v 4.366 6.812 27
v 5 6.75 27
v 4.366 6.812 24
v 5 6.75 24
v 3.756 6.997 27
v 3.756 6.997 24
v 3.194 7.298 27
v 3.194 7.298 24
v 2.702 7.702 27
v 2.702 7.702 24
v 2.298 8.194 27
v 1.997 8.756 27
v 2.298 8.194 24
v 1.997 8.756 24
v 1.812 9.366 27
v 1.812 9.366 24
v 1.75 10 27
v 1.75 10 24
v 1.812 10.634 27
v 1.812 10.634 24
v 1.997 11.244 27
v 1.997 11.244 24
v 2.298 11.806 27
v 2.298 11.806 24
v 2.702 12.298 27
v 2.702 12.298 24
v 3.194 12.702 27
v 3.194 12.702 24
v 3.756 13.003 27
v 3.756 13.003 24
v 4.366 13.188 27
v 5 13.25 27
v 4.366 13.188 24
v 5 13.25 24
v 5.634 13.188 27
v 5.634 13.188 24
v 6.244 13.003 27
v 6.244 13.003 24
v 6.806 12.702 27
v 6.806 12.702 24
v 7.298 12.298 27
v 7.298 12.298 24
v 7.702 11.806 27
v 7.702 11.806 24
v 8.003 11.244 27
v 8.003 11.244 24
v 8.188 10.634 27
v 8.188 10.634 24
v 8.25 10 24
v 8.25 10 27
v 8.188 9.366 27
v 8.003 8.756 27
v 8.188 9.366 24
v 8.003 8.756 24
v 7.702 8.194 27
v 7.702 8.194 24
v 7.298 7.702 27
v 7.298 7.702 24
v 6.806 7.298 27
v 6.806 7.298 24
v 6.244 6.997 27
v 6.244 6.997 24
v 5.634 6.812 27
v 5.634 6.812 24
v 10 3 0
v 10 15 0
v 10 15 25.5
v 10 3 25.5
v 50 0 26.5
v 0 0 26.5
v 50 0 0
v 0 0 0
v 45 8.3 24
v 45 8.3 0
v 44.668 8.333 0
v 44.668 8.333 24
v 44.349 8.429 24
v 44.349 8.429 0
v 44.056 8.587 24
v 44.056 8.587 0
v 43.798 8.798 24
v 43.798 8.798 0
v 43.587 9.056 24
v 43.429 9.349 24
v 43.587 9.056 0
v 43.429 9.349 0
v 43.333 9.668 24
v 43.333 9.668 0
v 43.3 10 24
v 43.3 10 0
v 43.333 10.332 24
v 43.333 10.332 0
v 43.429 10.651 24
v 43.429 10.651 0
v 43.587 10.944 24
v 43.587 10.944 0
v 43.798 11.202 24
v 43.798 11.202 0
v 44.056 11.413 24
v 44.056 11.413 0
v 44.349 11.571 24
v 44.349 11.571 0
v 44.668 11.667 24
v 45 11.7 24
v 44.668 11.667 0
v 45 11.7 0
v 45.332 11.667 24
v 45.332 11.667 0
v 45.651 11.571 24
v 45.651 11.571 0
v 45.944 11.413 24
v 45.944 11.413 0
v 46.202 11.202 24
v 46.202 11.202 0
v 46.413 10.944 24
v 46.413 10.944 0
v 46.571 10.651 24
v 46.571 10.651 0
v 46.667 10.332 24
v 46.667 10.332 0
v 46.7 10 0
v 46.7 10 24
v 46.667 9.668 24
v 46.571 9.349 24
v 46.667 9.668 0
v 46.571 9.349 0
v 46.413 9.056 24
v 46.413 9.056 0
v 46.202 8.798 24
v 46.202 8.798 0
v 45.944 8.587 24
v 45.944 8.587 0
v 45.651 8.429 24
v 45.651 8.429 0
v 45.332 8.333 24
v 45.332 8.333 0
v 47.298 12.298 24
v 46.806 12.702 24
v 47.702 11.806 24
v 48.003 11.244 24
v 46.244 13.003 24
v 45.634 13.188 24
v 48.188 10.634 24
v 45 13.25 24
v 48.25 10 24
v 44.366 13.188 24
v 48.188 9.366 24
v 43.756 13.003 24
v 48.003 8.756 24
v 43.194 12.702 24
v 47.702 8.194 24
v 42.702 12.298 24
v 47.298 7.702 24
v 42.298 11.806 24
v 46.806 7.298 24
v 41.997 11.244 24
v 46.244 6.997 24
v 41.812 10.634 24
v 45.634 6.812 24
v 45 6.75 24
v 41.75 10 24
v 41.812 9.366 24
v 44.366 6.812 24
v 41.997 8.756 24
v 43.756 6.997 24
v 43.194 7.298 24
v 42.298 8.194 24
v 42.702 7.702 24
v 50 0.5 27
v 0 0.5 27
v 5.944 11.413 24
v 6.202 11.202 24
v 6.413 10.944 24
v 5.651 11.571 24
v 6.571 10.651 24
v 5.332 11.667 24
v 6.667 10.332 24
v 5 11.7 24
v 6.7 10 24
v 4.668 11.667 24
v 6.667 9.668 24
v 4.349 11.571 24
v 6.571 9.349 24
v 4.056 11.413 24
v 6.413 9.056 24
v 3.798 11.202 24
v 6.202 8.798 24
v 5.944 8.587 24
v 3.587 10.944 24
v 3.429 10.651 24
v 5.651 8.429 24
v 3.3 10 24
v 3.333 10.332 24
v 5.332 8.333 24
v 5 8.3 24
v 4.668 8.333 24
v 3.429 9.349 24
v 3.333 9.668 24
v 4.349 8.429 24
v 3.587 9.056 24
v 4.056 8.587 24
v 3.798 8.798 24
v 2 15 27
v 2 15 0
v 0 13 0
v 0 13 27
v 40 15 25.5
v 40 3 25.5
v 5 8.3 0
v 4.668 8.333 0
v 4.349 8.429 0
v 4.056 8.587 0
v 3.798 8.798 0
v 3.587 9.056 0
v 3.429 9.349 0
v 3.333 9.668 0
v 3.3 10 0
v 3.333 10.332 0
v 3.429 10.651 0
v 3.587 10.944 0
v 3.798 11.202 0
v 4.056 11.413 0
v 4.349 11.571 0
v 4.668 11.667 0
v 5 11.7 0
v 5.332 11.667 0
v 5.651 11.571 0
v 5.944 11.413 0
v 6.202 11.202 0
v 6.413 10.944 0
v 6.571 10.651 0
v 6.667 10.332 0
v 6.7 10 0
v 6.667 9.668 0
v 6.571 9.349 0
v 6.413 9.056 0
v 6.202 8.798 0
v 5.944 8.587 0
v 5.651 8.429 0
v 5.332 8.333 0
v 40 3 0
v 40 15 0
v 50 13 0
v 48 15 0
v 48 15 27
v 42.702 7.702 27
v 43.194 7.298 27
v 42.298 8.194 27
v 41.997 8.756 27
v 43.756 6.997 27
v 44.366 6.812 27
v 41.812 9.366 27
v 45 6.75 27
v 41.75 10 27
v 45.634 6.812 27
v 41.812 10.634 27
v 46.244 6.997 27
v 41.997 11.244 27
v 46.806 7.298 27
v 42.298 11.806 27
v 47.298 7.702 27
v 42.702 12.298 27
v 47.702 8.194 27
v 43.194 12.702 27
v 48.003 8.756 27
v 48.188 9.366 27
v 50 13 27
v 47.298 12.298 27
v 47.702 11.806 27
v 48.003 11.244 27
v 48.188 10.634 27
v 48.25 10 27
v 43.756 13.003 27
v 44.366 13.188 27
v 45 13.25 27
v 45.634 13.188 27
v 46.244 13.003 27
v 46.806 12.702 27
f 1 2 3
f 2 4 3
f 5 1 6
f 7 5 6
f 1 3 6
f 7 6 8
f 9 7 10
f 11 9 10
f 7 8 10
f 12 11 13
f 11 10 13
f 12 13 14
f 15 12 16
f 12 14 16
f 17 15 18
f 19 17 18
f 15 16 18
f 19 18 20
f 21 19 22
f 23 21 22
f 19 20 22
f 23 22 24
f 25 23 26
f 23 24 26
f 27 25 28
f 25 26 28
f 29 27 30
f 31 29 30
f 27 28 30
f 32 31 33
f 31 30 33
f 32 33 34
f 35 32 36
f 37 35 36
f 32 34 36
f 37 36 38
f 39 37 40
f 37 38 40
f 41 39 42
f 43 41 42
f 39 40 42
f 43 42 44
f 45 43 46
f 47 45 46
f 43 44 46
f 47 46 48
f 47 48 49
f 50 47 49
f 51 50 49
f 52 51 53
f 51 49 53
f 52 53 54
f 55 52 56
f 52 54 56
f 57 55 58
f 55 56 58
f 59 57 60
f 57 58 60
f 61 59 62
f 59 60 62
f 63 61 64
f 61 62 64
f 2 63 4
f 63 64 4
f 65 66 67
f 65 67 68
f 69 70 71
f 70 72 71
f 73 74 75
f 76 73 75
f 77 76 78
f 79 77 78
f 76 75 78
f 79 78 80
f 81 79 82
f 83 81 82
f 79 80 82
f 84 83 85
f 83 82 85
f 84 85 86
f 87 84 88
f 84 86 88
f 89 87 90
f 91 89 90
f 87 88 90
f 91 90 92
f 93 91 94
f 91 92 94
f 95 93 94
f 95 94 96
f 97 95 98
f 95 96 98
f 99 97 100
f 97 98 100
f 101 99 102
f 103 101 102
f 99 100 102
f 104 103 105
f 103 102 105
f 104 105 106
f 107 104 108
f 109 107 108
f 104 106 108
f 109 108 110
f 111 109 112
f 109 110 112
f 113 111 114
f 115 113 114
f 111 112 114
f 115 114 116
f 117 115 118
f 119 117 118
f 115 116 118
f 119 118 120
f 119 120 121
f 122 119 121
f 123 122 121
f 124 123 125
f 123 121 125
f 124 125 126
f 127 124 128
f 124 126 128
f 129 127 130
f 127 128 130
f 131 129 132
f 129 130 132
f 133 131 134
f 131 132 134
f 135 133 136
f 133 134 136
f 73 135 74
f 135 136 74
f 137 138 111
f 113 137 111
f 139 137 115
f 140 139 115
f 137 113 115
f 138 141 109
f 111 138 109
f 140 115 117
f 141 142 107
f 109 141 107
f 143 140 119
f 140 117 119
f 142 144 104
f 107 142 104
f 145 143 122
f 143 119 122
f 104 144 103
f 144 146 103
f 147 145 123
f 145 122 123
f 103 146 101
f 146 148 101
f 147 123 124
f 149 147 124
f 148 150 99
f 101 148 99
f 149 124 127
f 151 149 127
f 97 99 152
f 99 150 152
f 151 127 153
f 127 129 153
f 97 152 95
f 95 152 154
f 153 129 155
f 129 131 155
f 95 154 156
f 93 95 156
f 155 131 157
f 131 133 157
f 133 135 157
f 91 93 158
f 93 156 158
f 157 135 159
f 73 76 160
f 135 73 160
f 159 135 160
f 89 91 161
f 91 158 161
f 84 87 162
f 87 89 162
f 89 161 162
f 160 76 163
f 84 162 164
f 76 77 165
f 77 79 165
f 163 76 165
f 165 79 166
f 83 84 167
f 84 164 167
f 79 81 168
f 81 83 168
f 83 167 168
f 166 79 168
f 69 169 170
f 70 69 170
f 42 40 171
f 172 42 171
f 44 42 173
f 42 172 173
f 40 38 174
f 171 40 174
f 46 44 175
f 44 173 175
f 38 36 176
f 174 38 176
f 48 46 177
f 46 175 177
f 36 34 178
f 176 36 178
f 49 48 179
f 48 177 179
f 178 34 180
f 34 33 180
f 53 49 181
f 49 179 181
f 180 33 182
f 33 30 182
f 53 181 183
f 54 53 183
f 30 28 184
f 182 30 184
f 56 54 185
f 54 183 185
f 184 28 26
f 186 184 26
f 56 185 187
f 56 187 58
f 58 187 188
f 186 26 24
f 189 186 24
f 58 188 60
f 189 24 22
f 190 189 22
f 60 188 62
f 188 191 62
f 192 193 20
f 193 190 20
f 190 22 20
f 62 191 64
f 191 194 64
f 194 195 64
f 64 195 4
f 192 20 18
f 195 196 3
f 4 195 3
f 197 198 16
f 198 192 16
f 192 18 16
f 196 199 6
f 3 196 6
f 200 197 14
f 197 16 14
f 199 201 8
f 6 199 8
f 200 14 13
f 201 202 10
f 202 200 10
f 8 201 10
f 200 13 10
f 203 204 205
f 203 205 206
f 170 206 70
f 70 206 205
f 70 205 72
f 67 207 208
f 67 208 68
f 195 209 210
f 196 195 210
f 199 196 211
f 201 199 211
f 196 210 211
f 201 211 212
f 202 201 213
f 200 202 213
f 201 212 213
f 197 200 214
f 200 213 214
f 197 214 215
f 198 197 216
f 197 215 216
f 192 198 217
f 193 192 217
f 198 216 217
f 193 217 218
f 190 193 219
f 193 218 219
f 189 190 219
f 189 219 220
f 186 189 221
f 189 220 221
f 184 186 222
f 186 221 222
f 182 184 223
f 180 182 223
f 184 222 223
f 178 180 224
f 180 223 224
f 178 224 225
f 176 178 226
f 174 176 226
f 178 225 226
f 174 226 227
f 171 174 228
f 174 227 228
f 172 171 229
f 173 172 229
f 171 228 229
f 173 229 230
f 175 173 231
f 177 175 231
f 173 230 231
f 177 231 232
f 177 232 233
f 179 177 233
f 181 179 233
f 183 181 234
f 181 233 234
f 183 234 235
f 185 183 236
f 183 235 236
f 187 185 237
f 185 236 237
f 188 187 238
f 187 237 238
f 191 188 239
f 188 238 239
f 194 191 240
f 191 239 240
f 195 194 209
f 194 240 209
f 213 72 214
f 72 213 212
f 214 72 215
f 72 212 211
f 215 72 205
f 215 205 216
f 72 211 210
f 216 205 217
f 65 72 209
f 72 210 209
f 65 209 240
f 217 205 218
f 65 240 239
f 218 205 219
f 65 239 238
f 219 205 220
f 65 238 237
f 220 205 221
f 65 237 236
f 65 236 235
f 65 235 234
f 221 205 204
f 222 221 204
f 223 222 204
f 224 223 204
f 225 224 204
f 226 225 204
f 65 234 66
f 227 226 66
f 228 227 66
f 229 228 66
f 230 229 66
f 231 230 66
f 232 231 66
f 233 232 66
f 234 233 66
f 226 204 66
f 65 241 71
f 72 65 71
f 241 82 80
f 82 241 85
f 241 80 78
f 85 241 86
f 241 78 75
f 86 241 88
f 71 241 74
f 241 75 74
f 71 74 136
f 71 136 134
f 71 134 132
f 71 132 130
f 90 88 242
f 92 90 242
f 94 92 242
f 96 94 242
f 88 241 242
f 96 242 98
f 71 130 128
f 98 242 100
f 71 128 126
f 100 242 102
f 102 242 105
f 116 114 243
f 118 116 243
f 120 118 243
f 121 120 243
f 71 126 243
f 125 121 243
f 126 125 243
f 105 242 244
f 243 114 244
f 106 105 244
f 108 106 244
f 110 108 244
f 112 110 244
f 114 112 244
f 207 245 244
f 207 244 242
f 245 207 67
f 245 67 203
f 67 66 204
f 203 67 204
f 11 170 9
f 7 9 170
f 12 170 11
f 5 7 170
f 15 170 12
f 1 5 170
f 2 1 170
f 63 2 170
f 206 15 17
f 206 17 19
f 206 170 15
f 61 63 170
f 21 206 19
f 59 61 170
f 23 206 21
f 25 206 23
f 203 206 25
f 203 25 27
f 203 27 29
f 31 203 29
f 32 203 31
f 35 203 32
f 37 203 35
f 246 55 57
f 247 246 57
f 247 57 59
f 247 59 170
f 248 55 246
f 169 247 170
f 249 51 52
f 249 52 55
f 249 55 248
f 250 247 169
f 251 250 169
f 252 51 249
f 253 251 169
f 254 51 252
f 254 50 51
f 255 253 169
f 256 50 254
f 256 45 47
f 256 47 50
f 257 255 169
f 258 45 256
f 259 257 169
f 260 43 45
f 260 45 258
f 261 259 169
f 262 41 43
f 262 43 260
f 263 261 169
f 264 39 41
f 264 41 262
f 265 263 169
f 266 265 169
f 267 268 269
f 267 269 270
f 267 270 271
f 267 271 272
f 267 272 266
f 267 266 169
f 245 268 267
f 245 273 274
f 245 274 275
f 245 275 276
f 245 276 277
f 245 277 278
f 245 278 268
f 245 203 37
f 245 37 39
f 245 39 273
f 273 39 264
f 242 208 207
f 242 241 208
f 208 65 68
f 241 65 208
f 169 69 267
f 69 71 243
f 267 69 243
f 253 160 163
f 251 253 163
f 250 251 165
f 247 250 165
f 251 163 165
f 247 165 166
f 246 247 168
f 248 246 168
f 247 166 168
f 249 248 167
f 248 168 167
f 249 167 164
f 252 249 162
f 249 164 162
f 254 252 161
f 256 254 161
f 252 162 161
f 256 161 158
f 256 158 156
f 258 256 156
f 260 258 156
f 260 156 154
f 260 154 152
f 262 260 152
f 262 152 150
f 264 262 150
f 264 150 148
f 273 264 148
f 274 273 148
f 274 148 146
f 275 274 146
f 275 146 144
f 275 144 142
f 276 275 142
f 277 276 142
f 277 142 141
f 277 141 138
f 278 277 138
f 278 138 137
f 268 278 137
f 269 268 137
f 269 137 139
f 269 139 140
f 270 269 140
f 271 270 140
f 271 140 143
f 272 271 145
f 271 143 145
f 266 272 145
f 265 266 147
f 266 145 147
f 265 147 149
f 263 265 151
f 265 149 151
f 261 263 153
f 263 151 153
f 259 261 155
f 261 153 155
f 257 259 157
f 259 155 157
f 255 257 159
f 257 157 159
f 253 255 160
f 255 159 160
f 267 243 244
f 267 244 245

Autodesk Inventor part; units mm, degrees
ref_plane "YZ Plane" through (0, 0, 0) normal (1, 0, 0) x (0, 1, 0)
ref_plane "XZ Plane" through (0, 0, 0) normal (0, 1, 0) x (-1, 0, 0)
ref_plane "XY Plane" through (0, 0, 0) normal (0, 0, 1) x (1, 0, 0)
sketch "Skizze1" plane through (0, 0, 0) normal (0, 0, 1) x (1, 0, 0)
  line L0 (0, 0) -> (50, 0)
  line L1 (50, 0) -> (50, 15)
  line L2 (50, 15) -> (0, 15)
  line L3 (0, 15) -> (0, 0)
  dimension "d0" = 15
  dimension "d1" = 50
extrude "Extrusion1" add sketch "Skizze1" along normal blind 27
hole "Bohrung1" at (45, 10, 27) direction (0, 0, -1) diameter 3.4 end through all counterbore diameter 6.5 counterbore depth 3 clearance for "Inbusschraube DIN EN ISO 4762" size "M3" standard "DIN"
hole "Bohrung2" at (5, 10, 27) direction (0, 0, -1) diameter 3.4 end through all counterbore diameter 6.5 counterbore depth 3 clearance for "Inbusschraube DIN EN ISO 4762" size "M3" standard "DIN"
chamfer "Fase1" distance 0.5 angle 45 1 edges at (25, 0, 27)
sketch "Skizze2" plane through (0, 0, 0) normal (0, 0, -1) x (-1, 0, 0)
  line L0 (0, 15) -> (0, 0) projected
  line L1 (-50, 15) -> (0, 15) projected
  line L2 (-50, 0) -> (-50, 15) projected
  line L3 (-40, 15) -> (-10, 15)
  line L4 (-10, 15) -> (-10, 3)
  line L5 (-10, 3) -> (-40, 3)
  line L6 (-40, 3) -> (-40, 15)
  dimension "d25" = 10
  dimension "d26" = 10
  dimension "d27" = 12
extrude "Extrusion2" cut sketch "Skizze2" against normal blind 25.5
chamfer "Fase2" distance 2 angle 45 2 edges at (50, 15, 13.5) (0, 15, 13.5)
properties part number "Peripherie_Motor2_liegend"
